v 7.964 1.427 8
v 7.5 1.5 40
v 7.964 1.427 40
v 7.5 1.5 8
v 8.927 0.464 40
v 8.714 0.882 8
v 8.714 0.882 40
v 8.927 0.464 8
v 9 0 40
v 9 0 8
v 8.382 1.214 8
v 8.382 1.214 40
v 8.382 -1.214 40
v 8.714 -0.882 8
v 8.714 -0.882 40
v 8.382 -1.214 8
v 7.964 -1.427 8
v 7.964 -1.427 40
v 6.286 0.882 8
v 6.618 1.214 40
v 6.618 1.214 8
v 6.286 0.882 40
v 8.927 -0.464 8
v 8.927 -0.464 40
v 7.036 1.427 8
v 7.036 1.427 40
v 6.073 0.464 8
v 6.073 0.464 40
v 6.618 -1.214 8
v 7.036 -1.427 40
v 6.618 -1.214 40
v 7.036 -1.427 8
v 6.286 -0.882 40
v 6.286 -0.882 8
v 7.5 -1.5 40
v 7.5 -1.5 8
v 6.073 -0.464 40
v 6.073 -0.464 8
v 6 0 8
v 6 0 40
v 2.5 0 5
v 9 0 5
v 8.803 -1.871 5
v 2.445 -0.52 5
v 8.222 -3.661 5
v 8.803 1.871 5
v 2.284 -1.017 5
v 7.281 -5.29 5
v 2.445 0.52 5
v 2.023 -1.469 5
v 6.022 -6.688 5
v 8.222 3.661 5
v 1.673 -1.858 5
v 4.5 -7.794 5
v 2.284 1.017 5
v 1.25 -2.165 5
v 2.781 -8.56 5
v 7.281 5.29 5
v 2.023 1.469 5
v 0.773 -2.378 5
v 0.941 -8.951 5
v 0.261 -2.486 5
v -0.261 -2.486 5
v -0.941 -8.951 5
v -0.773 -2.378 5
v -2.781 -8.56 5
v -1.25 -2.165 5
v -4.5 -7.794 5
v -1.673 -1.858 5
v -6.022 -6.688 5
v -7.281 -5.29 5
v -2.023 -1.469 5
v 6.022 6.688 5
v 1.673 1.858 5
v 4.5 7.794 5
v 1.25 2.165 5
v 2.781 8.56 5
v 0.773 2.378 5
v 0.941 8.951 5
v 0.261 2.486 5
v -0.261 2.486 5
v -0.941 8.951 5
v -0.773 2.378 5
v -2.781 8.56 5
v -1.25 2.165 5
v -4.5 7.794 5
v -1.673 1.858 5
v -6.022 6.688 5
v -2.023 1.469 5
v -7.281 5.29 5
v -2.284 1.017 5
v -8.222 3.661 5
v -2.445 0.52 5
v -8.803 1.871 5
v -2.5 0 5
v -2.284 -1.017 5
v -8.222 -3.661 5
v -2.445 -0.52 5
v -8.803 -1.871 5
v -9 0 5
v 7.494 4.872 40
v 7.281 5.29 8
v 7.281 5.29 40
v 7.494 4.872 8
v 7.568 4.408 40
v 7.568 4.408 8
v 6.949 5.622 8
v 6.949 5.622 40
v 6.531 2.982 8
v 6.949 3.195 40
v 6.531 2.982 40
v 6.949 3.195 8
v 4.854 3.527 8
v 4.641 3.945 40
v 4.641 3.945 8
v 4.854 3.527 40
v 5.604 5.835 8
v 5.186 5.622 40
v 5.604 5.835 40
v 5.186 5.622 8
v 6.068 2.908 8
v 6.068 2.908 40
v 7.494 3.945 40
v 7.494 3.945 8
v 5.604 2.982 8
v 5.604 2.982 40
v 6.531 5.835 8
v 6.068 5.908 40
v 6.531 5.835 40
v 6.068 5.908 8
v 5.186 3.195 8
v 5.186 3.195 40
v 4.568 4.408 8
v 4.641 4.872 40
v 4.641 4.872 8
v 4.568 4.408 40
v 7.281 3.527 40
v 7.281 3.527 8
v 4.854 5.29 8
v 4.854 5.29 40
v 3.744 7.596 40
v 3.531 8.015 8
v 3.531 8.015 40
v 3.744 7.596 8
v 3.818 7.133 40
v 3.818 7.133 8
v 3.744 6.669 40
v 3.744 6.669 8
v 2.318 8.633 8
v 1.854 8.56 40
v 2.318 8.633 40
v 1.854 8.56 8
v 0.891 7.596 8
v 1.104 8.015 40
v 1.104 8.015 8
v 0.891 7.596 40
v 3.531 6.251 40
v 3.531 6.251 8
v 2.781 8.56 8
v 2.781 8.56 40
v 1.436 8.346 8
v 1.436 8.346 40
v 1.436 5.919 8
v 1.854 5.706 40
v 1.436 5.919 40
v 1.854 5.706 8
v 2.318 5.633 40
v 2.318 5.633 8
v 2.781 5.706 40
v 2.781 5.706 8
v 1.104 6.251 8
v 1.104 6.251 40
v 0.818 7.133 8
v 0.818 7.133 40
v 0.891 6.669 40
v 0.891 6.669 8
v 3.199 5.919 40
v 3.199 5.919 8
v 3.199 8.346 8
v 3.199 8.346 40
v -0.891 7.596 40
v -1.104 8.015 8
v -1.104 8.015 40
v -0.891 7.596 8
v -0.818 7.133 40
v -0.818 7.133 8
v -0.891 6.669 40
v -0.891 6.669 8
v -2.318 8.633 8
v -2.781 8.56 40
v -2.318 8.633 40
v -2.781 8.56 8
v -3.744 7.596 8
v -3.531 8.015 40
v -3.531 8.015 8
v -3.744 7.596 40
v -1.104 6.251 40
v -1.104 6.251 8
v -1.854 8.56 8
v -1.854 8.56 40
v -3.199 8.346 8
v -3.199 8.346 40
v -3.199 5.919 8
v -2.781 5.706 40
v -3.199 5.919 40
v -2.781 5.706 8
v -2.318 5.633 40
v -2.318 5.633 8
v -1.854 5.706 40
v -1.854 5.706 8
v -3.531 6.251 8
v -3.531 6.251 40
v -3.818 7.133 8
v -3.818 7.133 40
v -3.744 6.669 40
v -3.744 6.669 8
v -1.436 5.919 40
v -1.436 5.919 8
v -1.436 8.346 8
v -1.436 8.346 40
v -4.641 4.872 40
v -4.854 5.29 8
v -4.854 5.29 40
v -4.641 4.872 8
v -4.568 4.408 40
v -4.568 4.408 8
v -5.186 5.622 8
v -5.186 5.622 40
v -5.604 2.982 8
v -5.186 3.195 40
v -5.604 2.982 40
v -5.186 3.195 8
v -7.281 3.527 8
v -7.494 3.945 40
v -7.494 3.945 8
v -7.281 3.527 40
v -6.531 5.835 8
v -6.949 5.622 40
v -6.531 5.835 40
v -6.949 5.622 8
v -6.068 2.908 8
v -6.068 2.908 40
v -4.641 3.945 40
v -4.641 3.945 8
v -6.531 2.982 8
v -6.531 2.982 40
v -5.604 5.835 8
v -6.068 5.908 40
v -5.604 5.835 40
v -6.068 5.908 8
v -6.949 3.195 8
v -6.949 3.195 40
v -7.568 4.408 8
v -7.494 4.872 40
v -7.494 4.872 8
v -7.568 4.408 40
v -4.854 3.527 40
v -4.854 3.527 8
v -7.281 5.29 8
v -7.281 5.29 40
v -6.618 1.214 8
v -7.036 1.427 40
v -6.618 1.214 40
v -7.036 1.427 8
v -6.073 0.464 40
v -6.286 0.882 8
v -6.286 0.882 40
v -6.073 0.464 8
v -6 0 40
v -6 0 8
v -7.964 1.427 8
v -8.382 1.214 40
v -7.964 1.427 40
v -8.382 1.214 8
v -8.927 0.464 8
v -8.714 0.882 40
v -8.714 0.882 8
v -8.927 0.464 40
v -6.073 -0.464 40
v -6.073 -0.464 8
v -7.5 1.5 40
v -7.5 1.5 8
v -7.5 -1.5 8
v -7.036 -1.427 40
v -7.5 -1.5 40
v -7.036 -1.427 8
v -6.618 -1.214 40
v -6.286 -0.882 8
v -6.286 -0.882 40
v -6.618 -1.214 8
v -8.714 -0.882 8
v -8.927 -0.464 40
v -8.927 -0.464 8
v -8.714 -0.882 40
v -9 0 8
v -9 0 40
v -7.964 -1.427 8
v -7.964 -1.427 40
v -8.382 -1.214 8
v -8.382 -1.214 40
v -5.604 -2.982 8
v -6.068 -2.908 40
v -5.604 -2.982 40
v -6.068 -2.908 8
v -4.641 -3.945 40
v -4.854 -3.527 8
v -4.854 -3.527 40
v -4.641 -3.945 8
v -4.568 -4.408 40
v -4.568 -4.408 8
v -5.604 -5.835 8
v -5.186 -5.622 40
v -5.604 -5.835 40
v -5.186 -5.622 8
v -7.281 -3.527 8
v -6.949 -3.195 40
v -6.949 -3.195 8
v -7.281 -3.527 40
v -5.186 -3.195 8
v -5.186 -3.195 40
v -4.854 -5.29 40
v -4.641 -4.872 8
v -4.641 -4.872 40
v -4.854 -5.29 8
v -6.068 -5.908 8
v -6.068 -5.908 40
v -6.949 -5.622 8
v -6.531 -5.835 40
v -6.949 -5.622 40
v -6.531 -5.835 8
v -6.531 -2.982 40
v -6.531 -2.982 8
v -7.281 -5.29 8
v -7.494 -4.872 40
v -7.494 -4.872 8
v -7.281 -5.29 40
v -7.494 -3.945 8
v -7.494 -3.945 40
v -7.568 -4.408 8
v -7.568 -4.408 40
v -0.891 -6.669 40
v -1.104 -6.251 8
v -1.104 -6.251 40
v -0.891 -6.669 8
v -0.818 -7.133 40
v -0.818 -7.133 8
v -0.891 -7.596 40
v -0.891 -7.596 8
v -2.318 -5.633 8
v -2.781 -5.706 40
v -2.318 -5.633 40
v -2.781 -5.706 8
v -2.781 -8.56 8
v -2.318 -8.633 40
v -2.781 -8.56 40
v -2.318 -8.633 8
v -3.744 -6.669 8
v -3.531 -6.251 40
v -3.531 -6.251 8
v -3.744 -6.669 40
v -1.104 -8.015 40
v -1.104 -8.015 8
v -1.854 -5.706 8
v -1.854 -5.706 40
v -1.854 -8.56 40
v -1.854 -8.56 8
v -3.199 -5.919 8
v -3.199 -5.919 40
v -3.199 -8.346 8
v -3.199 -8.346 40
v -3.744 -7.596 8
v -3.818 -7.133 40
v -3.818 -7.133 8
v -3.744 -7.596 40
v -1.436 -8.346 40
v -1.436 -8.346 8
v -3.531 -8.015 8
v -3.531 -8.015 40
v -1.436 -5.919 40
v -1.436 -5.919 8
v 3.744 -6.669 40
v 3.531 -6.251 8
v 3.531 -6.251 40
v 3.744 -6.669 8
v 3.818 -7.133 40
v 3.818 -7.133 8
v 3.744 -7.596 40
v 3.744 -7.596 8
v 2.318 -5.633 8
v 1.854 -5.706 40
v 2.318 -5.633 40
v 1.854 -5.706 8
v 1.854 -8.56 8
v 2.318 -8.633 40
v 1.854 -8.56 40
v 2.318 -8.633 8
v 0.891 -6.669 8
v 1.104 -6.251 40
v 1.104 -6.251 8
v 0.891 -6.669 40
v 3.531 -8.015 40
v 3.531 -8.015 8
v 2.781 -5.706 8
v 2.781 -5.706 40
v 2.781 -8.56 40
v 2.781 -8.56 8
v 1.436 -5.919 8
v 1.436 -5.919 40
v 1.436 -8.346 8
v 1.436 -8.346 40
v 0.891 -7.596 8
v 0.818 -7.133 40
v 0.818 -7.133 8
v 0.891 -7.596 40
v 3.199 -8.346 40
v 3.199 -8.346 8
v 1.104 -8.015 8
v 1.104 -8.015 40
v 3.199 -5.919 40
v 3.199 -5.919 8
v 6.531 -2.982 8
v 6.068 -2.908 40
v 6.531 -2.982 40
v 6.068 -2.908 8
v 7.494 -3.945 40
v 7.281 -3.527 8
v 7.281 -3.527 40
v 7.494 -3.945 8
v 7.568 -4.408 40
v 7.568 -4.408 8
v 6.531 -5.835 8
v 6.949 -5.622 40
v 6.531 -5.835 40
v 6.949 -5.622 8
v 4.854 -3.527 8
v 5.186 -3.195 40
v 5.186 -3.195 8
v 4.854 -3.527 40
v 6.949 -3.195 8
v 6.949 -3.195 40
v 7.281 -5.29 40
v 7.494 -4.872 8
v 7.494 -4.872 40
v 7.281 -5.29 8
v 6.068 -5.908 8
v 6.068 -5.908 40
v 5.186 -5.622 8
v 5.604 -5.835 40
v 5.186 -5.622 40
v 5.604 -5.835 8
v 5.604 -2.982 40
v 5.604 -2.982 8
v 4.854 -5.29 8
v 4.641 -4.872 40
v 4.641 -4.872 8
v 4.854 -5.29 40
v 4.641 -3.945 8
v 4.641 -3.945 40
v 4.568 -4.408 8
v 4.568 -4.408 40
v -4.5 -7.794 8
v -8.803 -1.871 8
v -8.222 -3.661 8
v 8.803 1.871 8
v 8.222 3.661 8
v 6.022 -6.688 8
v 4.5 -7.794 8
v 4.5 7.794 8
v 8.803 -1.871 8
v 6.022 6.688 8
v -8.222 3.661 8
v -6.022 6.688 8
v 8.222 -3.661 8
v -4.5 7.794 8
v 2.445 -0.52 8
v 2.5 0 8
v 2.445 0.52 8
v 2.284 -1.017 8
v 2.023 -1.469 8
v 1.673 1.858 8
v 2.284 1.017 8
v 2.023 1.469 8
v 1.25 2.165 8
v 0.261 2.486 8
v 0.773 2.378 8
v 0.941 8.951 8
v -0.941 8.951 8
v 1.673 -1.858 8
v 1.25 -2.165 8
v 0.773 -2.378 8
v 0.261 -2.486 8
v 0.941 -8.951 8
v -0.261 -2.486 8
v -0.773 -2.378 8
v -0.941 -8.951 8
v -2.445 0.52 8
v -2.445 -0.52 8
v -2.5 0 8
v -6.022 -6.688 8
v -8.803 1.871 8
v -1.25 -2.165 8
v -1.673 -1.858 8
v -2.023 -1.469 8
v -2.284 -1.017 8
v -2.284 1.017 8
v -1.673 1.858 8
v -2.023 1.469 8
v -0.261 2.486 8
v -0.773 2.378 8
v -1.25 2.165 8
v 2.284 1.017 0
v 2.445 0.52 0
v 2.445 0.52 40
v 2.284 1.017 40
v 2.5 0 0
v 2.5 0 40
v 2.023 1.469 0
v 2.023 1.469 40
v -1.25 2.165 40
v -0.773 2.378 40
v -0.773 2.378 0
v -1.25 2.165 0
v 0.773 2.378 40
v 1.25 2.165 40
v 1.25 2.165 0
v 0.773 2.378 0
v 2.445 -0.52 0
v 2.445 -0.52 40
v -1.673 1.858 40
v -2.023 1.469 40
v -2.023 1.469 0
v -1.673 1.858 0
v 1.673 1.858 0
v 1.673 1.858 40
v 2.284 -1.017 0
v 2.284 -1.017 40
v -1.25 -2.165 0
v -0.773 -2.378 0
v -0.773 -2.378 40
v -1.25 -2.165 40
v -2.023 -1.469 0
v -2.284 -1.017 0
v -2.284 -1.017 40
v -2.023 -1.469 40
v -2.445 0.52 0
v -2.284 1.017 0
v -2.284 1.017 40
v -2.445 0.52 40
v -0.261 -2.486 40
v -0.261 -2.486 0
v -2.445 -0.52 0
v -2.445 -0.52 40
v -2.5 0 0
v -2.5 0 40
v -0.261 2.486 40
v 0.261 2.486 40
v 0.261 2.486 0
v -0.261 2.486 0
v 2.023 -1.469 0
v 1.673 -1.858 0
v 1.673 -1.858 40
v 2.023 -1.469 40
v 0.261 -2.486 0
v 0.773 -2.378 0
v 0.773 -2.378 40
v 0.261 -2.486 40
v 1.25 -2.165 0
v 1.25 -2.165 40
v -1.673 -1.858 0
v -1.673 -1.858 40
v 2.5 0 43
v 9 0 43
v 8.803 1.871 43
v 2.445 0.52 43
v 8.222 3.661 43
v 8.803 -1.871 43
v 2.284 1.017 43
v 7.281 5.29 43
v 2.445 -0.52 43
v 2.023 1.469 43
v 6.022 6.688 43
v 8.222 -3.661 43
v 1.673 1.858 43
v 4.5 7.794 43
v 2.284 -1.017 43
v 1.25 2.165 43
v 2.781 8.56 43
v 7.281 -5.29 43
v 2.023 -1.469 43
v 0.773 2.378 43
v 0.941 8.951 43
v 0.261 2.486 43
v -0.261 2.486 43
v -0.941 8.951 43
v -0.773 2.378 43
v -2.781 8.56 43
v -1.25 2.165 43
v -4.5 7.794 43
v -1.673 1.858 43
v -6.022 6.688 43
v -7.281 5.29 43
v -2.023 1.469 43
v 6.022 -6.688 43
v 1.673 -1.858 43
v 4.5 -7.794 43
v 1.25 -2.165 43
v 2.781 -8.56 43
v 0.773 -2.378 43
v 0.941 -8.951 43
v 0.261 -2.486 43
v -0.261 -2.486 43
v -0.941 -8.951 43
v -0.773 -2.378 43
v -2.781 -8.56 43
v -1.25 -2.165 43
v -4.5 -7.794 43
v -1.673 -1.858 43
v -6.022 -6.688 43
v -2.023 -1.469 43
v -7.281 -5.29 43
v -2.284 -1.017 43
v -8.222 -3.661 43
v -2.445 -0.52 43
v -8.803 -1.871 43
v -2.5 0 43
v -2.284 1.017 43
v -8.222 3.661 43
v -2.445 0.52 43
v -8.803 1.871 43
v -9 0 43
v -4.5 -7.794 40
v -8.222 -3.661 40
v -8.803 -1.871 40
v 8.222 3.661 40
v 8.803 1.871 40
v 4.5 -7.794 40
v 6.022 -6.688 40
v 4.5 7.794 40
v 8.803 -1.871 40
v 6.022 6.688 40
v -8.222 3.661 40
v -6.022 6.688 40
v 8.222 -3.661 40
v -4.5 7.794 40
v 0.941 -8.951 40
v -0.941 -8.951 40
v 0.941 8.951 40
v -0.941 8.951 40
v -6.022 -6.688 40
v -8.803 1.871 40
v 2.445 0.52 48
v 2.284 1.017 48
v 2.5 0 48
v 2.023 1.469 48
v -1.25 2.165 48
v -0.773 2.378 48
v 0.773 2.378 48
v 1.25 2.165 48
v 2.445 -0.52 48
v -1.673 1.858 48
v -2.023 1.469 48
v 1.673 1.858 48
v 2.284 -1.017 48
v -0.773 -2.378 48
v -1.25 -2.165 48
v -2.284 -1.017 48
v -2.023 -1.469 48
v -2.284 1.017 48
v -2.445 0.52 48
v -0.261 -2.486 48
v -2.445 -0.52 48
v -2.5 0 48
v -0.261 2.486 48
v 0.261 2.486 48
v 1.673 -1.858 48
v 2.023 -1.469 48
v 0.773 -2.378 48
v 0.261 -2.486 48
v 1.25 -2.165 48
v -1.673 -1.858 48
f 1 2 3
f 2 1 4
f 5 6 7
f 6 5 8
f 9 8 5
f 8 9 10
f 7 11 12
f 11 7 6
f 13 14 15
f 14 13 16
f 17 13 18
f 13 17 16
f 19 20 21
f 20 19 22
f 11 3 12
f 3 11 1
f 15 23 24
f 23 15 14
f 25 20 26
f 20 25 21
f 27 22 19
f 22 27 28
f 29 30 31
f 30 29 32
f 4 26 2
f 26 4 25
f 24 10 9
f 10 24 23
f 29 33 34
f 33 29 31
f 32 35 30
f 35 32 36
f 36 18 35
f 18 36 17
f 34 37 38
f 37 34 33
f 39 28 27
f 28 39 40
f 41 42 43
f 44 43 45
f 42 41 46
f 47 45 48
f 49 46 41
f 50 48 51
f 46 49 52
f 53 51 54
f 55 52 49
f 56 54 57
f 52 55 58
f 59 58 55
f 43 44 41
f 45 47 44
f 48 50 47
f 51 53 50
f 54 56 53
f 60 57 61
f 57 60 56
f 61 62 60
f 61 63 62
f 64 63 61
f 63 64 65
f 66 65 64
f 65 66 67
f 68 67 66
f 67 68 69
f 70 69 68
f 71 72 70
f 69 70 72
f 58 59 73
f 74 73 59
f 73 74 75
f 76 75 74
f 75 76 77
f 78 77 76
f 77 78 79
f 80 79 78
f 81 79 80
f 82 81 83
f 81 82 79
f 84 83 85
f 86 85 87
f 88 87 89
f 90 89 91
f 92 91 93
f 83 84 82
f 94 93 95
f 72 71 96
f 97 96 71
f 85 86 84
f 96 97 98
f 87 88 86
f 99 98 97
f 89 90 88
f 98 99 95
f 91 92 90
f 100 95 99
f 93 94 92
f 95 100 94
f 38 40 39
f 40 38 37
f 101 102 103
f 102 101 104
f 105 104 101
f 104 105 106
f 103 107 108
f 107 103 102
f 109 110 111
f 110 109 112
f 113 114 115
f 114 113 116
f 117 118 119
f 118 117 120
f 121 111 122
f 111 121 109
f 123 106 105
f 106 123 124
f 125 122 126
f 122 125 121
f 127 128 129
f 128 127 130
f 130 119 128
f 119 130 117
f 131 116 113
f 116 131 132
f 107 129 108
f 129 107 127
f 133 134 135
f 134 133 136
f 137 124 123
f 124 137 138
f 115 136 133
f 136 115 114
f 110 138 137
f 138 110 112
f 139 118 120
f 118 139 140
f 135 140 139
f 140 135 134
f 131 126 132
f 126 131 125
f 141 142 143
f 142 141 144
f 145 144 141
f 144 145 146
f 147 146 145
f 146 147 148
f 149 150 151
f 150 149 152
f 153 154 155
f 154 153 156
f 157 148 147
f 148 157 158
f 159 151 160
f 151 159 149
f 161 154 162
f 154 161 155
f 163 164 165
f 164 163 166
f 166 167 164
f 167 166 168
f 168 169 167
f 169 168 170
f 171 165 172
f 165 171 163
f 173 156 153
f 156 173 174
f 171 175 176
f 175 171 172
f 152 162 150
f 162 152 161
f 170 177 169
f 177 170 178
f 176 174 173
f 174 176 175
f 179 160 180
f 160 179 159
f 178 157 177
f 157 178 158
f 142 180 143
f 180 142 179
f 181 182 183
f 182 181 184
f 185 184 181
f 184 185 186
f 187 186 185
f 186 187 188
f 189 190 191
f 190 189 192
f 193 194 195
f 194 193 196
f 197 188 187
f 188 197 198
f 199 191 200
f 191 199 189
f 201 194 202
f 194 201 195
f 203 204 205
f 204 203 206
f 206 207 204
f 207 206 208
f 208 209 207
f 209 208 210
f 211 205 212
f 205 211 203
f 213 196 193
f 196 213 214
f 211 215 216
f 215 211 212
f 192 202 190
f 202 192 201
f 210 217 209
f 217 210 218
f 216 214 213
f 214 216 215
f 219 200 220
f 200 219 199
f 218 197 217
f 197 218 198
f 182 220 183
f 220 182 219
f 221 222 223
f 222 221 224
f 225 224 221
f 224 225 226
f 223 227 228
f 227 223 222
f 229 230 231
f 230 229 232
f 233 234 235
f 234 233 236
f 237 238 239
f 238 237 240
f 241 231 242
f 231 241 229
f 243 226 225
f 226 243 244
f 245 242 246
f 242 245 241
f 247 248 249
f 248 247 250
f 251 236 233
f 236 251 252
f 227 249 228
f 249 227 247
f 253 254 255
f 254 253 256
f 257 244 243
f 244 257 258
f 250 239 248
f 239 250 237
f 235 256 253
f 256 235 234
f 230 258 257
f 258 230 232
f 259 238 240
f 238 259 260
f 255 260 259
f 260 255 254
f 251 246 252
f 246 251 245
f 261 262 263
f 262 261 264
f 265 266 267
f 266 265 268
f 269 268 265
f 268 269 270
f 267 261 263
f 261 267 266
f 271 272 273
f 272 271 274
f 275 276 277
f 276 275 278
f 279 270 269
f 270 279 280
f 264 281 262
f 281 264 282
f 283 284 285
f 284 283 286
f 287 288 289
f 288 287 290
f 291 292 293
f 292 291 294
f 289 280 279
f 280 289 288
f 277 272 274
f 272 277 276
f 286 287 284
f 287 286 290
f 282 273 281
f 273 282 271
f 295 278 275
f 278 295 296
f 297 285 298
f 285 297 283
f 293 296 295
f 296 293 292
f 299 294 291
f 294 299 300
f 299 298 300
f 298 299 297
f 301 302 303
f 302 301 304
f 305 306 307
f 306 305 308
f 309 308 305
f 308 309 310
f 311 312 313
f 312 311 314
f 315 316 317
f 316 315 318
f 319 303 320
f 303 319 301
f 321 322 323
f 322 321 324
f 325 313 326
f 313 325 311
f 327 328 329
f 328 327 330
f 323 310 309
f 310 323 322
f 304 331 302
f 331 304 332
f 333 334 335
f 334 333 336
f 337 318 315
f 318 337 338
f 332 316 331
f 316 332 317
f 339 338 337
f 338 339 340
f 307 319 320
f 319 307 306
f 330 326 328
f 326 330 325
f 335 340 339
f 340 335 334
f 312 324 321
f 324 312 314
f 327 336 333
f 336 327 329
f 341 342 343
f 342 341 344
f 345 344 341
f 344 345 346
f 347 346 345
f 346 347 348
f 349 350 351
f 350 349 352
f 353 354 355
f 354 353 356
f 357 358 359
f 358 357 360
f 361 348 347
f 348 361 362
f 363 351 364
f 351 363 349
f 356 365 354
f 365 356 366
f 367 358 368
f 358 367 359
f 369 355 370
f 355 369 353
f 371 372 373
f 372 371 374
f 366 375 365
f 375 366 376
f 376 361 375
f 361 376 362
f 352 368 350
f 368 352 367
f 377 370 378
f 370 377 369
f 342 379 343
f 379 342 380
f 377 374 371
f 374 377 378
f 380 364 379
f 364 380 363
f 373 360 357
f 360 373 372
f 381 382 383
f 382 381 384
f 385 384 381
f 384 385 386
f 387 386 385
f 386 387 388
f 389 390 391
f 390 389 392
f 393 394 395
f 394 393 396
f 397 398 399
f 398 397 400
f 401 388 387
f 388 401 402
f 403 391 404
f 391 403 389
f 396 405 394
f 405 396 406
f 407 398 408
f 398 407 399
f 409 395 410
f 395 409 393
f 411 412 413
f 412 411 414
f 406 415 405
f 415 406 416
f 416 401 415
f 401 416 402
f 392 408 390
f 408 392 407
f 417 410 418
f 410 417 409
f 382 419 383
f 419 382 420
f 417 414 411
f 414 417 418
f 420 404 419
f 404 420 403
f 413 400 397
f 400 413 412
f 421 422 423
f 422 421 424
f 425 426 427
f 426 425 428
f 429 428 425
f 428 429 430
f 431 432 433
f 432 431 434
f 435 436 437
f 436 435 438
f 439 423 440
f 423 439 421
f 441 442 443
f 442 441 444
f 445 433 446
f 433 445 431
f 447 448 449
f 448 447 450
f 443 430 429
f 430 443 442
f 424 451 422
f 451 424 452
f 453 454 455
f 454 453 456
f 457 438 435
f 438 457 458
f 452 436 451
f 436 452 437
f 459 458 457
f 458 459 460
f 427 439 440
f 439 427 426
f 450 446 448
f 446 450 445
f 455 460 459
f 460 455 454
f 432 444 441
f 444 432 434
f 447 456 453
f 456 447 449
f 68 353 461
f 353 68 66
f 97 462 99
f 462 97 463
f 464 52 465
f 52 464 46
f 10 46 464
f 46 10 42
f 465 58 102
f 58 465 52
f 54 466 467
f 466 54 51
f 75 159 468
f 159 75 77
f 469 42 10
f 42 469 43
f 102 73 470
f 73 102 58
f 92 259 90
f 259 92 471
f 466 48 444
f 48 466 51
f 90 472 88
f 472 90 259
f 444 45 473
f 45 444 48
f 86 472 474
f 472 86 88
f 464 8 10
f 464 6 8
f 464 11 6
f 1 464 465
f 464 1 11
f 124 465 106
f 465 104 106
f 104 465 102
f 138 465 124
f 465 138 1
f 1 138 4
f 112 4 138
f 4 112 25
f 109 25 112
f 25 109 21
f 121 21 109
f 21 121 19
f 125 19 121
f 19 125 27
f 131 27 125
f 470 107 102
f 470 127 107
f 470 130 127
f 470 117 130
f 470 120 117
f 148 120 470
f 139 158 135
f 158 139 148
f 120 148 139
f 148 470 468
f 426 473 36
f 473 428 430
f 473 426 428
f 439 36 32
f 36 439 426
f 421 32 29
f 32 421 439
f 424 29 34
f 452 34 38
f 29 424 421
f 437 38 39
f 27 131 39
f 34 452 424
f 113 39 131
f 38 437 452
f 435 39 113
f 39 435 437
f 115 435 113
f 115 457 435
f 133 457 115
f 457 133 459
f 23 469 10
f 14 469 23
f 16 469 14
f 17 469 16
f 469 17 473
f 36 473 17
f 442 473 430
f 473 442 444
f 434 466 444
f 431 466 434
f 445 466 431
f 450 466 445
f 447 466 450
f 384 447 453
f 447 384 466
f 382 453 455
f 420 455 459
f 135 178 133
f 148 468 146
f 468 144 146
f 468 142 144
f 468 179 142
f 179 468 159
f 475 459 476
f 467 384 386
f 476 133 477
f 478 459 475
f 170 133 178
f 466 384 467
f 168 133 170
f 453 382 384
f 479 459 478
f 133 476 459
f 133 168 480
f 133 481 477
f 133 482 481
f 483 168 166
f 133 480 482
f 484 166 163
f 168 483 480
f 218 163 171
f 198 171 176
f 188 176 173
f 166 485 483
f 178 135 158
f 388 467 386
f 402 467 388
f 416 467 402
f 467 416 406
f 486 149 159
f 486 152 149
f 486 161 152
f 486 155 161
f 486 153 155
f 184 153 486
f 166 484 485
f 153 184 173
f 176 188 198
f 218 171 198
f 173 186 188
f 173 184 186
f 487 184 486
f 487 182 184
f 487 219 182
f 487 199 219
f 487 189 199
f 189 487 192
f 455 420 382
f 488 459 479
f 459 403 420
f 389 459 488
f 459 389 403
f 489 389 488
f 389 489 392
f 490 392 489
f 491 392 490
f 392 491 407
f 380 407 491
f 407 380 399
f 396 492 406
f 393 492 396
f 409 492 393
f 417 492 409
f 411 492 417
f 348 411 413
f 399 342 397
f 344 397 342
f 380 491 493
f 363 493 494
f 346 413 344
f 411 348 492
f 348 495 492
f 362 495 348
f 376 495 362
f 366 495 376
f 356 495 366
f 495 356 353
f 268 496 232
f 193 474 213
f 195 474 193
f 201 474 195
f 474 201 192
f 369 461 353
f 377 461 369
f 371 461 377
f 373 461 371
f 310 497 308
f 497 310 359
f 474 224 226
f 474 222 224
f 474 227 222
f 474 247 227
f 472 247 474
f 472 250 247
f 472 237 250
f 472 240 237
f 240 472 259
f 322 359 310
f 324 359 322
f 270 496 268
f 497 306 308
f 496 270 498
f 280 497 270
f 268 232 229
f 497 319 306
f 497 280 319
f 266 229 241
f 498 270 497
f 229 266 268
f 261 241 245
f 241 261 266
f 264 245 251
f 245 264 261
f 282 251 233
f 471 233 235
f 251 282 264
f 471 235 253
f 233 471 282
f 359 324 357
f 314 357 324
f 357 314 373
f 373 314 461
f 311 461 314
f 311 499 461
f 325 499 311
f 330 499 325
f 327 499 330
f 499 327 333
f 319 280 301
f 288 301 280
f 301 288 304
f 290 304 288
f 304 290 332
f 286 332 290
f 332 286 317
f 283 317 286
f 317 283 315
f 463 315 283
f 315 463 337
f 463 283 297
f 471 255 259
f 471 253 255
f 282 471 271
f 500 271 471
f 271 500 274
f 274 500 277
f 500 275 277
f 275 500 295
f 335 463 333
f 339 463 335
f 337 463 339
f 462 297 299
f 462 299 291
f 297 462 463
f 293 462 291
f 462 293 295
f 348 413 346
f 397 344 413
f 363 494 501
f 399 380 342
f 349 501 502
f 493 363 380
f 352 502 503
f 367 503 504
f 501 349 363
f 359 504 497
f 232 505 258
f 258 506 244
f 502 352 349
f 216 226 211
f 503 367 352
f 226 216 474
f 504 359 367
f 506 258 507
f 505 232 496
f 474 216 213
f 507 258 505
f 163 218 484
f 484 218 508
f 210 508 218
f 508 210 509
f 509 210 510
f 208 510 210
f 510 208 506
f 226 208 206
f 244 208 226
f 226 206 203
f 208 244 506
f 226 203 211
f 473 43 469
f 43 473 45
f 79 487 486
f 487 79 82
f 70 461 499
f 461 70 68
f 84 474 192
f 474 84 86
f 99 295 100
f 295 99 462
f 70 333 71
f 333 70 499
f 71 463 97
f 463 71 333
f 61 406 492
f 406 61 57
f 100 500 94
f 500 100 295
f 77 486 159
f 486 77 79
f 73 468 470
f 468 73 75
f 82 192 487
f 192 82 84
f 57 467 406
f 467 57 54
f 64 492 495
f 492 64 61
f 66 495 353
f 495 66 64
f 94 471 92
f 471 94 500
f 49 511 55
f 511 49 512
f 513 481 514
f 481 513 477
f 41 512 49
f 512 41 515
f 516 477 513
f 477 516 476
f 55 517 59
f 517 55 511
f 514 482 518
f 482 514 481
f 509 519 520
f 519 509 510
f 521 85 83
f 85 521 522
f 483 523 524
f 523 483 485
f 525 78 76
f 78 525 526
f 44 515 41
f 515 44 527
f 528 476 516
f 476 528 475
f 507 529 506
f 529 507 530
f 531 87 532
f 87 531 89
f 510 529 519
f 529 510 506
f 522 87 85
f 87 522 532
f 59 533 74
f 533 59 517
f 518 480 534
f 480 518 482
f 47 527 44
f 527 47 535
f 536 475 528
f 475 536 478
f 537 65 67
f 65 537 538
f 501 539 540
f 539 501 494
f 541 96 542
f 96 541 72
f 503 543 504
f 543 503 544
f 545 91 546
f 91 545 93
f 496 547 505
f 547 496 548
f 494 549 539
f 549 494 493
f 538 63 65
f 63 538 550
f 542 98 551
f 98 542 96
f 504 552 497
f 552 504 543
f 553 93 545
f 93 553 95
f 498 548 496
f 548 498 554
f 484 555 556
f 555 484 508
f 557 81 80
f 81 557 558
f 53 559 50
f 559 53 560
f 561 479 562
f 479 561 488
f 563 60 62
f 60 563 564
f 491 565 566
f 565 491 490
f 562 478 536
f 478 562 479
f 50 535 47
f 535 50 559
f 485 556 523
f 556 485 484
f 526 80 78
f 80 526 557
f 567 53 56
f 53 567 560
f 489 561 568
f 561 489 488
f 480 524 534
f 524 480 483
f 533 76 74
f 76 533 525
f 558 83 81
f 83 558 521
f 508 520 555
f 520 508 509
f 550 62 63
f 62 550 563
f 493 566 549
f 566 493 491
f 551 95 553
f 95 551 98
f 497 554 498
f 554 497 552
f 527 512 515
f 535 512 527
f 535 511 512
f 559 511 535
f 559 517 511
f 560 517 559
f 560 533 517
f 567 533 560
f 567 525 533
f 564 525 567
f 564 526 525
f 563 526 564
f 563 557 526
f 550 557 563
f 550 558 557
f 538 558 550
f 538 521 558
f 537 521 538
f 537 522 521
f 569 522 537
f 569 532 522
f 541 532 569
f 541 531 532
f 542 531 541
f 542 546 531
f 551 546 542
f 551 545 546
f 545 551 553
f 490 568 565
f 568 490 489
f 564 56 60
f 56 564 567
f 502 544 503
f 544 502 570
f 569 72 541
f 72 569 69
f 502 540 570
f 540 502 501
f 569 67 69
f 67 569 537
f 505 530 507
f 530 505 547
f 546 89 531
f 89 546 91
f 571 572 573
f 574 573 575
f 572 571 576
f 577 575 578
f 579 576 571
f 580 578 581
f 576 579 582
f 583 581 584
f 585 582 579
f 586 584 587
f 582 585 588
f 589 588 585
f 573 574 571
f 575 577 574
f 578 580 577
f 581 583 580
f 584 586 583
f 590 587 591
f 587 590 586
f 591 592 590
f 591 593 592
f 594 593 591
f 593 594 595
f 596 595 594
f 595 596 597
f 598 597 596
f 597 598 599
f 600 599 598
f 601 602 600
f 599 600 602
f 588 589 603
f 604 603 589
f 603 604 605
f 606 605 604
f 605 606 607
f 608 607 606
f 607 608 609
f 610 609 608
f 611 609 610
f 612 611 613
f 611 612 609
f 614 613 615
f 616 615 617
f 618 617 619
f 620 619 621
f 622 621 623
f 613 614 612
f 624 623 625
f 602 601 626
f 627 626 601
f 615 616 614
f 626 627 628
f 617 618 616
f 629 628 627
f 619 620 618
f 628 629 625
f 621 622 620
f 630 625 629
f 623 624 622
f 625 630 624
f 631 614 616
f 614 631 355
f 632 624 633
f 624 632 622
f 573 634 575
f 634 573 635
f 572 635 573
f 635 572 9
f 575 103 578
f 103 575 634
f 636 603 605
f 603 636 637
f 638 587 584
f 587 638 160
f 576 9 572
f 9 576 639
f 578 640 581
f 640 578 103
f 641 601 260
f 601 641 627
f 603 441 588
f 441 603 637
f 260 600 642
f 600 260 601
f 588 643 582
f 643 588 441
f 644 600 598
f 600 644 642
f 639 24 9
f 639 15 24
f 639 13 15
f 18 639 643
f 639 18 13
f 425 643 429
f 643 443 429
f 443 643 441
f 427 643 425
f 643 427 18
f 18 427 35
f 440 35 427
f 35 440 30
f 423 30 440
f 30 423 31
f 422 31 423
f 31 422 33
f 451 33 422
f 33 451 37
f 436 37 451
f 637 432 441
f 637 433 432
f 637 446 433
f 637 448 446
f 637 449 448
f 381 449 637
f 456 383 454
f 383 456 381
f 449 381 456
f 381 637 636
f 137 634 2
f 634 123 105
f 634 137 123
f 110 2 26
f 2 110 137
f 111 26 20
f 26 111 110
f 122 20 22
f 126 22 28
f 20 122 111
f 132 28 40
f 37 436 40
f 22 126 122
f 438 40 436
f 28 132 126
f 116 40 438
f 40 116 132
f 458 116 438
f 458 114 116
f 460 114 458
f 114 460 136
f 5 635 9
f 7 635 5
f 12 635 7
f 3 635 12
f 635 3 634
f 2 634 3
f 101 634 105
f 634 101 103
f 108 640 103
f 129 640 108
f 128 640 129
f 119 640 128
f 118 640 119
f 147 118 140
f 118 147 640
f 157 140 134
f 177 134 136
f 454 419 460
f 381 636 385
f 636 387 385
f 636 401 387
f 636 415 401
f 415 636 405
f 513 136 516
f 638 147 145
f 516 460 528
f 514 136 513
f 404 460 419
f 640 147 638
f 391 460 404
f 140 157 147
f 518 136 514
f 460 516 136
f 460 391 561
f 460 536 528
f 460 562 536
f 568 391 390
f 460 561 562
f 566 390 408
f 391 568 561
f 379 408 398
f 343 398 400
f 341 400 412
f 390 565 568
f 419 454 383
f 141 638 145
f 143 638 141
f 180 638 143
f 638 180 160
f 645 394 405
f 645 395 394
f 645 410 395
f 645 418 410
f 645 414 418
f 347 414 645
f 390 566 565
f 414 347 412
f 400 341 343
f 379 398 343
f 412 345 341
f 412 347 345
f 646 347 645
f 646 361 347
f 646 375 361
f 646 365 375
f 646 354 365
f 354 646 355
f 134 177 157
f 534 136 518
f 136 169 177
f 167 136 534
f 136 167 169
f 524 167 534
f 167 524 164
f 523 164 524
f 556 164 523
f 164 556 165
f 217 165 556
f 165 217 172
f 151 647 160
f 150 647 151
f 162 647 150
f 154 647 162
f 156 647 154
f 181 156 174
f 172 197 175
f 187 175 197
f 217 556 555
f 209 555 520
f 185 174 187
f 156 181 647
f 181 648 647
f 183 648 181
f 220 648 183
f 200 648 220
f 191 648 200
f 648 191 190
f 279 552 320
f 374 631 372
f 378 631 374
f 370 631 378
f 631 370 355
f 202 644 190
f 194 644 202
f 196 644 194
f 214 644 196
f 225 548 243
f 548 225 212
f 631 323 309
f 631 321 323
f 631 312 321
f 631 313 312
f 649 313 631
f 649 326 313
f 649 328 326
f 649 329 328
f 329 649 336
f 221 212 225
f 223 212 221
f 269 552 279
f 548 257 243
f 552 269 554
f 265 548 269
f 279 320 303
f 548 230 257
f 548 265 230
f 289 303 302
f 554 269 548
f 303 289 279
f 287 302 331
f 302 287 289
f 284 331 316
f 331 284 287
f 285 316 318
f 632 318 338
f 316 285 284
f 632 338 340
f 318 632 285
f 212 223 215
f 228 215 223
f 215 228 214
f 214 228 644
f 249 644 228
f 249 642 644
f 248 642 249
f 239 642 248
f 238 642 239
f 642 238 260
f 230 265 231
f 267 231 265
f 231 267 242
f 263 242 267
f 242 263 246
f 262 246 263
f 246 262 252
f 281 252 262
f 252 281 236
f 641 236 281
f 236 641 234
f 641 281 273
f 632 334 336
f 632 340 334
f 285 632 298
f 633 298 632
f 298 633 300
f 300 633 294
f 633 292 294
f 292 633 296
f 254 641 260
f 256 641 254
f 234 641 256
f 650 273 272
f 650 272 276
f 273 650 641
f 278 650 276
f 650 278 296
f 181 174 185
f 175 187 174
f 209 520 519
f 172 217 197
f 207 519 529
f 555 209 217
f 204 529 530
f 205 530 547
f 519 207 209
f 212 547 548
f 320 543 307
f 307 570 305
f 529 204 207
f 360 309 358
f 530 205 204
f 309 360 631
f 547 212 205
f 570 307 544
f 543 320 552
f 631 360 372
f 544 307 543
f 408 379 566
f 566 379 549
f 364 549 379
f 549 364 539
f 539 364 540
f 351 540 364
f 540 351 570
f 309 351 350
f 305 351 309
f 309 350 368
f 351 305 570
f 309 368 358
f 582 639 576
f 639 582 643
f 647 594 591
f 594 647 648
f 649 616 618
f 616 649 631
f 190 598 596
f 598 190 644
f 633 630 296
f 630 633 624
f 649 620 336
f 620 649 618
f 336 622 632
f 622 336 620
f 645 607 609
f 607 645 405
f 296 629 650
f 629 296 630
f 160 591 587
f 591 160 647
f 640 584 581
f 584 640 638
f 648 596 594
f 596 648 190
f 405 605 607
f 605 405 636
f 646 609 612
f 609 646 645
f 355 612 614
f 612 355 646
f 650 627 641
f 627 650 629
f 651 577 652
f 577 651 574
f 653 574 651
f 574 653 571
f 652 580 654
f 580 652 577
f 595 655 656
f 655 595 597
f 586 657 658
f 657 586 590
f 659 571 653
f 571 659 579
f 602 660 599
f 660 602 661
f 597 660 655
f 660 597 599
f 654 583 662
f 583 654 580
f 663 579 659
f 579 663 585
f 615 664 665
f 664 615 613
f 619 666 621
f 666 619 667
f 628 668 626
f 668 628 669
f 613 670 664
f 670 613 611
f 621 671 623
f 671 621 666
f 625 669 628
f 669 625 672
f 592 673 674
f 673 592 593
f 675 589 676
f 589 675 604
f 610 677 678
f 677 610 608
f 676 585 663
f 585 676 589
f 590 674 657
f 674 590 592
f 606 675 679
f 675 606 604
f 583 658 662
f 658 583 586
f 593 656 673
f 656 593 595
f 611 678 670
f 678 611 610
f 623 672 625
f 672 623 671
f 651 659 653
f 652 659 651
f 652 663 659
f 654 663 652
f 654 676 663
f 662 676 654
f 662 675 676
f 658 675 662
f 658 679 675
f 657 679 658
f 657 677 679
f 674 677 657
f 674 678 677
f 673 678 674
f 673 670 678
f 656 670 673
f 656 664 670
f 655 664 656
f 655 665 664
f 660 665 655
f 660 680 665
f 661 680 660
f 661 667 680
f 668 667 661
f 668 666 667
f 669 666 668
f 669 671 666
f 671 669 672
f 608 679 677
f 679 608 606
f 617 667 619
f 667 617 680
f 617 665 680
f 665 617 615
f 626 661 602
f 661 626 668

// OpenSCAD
// file: functions.scad
// -----------------------------------------------------
// Utility: squircle (circle + rectangle)
// -----------------------------------------------------

module squircle(radius, foot, segments) {
    union() {
        circle(r = radius, $fn = segments);
        translate([-(radius + foot) / 2, 0, 0])
            square([foot + radius, 2 * radius], center = true);
    }
}
// main file
// =====================================================
// Soldering Station Organizers
// - Desoldering pump holder
// - Solder spool holder (U-bracket + axle)
// =====================================================
include <functions.scad>
$fn = 30;

// -----------------------------------------------------
// Parameters – Solder spool axle + U-shaped holder
// -----------------------------------------------------

inner_shaft_radius   = 2.5;   // Small axle radius (fits 6 mm bore)
outer_shaft_radius   = 9;     // Large axle radius (fits 20 mm bore)
holder_thickness     = 4;     // Thickness of spool holder arms
arm_span             = 40 + holder_thickness; // Distance between outer faces of U arms
strut_thickness      = 3;     // Thickness of internal support struts
shaft_gap            = 1;     // Gap between shaft and holder
circle_segments      = 30;

// Panel shape parameters
panel_width          = 60;
panel_foot           = 10;


// -----------------------------------------------------
// Parameters – Desoldering pump holder
// -----------------------------------------------------

pump_holder_width    = 40;
pump_holder_length   = 60;
pump_holder_thick    = 4;
pump_tip_radius      = 4;
pump_body_radius     = 10;

// -----------------------------------------------------
// Solder spool axle (double-ended shaft + struts)
// -----------------------------------------------------

module half_spool_shaft() {
    translate([0, 0, -(arm_span+holder_thickness) / 2]) {
        // Central shaft
        cylinder(h = (arm_span+holder_thickness) / 2, r = inner_shaft_radius, $fn = 30);

        // Outer ring + radial struts
        translate([0, 0, holder_thickness + shaft_gap]) {
            cylinder(h = strut_thickness, r = outer_shaft_radius, $fn = 30);

            // Radial spokes
            for (angle = [0 : 36 : 360]) {
                translate([
                    (outer_shaft_radius - strut_thickness / 2) * cos(angle),
                    (outer_shaft_radius - strut_thickness / 2) * sin(angle),
                    0
                ])
                    cylinder(h = arm_span / 2 - shaft_gap,
                             r = strut_thickness / 2, $fn = 20);
            }
        }
    }
}

module spool_shaft() {
    union() {
        half_spool_shaft();
        mirror([0, 0, 1])
            half_spool_shaft();
    }
}


// -----------------------------------------------------
// Solder spool U‑shaped holder
// -----------------------------------------------------

module spool_holder() {
    union() {
        // Front panel
        translate([0, 0, arm_span]) {
            linear_extrude(height = holder_thickness) {
                difference() {
                    squircle(panel_width / 2, panel_foot, circle_segments);
                    rotate(160)
                        squircle(panel_width / 20, panel_width, circle_segments);
                }
            }
        }

        // Rear panel
        linear_extrude(height = holder_thickness) {
            difference() {
                squircle(panel_width / 2, panel_foot, circle_segments);
                rotate(160)
                    squircle(panel_width / 20, panel_width, circle_segments);
            }
        }

        // Side bridge between panels (U shape)
        translate([-(panel_width / 2 + panel_foot), 0, arm_span / 2])
            rotate([0, 90, 0])
                linear_extrude(height = holder_thickness)
                    square([arm_span, panel_width], center = true);
    }
}


// -----------------------------------------------------
// Desoldering pump holder
// -----------------------------------------------------

module desoldering_pump_holder() {
    union() {
        // Front ring + support
        translate([0, 0, pump_holder_length])
            linear_extrude(height = pump_holder_thick) {
                difference() {
                    union() {
                        circle(r = pump_holder_width / 2, $fn = 50);
                        translate([-pump_holder_width / 4, 0, 0])
                            square([pump_holder_width / 2, pump_holder_width], center = true);
                    }
                    circle(r = pump_tip_radius, $fn = 50);  // inner hole
                }
            }

        // Rear ring + support
        linear_extrude(height = pump_holder_thick) {
            difference() {
                union() {
                    circle(r = pump_holder_width / 2, $fn = 50);
                    translate([-pump_holder_width / 4, 0, 0])
                        square([pump_holder_width / 2, pump_holder_width], center = true);
                }
                circle(r = pump_body_radius, $fn = 50); // larger inner cutout
            }
        }

        // Base arm connecting rings
        translate([-pump_holder_width / 2, -pump_holder_width / 2, 0])
            rotate([0, -90, 0])
                linear_extrude(height = pump_holder_thick)
                    square([pump_holder_length + pump_holder_thick, pump_holder_width]);
    }
}


// -----------------------------------------------------
// Assembly – show all parts
// -----------------------------------------------------

//color("orange") translate(v = [0,100,0]) desoldering_pump_holder();
//color("green") spool_holder();
color("yellow") translate(v = [0,0,(arm_span+holder_thickness)/2]) spool_shaft();
